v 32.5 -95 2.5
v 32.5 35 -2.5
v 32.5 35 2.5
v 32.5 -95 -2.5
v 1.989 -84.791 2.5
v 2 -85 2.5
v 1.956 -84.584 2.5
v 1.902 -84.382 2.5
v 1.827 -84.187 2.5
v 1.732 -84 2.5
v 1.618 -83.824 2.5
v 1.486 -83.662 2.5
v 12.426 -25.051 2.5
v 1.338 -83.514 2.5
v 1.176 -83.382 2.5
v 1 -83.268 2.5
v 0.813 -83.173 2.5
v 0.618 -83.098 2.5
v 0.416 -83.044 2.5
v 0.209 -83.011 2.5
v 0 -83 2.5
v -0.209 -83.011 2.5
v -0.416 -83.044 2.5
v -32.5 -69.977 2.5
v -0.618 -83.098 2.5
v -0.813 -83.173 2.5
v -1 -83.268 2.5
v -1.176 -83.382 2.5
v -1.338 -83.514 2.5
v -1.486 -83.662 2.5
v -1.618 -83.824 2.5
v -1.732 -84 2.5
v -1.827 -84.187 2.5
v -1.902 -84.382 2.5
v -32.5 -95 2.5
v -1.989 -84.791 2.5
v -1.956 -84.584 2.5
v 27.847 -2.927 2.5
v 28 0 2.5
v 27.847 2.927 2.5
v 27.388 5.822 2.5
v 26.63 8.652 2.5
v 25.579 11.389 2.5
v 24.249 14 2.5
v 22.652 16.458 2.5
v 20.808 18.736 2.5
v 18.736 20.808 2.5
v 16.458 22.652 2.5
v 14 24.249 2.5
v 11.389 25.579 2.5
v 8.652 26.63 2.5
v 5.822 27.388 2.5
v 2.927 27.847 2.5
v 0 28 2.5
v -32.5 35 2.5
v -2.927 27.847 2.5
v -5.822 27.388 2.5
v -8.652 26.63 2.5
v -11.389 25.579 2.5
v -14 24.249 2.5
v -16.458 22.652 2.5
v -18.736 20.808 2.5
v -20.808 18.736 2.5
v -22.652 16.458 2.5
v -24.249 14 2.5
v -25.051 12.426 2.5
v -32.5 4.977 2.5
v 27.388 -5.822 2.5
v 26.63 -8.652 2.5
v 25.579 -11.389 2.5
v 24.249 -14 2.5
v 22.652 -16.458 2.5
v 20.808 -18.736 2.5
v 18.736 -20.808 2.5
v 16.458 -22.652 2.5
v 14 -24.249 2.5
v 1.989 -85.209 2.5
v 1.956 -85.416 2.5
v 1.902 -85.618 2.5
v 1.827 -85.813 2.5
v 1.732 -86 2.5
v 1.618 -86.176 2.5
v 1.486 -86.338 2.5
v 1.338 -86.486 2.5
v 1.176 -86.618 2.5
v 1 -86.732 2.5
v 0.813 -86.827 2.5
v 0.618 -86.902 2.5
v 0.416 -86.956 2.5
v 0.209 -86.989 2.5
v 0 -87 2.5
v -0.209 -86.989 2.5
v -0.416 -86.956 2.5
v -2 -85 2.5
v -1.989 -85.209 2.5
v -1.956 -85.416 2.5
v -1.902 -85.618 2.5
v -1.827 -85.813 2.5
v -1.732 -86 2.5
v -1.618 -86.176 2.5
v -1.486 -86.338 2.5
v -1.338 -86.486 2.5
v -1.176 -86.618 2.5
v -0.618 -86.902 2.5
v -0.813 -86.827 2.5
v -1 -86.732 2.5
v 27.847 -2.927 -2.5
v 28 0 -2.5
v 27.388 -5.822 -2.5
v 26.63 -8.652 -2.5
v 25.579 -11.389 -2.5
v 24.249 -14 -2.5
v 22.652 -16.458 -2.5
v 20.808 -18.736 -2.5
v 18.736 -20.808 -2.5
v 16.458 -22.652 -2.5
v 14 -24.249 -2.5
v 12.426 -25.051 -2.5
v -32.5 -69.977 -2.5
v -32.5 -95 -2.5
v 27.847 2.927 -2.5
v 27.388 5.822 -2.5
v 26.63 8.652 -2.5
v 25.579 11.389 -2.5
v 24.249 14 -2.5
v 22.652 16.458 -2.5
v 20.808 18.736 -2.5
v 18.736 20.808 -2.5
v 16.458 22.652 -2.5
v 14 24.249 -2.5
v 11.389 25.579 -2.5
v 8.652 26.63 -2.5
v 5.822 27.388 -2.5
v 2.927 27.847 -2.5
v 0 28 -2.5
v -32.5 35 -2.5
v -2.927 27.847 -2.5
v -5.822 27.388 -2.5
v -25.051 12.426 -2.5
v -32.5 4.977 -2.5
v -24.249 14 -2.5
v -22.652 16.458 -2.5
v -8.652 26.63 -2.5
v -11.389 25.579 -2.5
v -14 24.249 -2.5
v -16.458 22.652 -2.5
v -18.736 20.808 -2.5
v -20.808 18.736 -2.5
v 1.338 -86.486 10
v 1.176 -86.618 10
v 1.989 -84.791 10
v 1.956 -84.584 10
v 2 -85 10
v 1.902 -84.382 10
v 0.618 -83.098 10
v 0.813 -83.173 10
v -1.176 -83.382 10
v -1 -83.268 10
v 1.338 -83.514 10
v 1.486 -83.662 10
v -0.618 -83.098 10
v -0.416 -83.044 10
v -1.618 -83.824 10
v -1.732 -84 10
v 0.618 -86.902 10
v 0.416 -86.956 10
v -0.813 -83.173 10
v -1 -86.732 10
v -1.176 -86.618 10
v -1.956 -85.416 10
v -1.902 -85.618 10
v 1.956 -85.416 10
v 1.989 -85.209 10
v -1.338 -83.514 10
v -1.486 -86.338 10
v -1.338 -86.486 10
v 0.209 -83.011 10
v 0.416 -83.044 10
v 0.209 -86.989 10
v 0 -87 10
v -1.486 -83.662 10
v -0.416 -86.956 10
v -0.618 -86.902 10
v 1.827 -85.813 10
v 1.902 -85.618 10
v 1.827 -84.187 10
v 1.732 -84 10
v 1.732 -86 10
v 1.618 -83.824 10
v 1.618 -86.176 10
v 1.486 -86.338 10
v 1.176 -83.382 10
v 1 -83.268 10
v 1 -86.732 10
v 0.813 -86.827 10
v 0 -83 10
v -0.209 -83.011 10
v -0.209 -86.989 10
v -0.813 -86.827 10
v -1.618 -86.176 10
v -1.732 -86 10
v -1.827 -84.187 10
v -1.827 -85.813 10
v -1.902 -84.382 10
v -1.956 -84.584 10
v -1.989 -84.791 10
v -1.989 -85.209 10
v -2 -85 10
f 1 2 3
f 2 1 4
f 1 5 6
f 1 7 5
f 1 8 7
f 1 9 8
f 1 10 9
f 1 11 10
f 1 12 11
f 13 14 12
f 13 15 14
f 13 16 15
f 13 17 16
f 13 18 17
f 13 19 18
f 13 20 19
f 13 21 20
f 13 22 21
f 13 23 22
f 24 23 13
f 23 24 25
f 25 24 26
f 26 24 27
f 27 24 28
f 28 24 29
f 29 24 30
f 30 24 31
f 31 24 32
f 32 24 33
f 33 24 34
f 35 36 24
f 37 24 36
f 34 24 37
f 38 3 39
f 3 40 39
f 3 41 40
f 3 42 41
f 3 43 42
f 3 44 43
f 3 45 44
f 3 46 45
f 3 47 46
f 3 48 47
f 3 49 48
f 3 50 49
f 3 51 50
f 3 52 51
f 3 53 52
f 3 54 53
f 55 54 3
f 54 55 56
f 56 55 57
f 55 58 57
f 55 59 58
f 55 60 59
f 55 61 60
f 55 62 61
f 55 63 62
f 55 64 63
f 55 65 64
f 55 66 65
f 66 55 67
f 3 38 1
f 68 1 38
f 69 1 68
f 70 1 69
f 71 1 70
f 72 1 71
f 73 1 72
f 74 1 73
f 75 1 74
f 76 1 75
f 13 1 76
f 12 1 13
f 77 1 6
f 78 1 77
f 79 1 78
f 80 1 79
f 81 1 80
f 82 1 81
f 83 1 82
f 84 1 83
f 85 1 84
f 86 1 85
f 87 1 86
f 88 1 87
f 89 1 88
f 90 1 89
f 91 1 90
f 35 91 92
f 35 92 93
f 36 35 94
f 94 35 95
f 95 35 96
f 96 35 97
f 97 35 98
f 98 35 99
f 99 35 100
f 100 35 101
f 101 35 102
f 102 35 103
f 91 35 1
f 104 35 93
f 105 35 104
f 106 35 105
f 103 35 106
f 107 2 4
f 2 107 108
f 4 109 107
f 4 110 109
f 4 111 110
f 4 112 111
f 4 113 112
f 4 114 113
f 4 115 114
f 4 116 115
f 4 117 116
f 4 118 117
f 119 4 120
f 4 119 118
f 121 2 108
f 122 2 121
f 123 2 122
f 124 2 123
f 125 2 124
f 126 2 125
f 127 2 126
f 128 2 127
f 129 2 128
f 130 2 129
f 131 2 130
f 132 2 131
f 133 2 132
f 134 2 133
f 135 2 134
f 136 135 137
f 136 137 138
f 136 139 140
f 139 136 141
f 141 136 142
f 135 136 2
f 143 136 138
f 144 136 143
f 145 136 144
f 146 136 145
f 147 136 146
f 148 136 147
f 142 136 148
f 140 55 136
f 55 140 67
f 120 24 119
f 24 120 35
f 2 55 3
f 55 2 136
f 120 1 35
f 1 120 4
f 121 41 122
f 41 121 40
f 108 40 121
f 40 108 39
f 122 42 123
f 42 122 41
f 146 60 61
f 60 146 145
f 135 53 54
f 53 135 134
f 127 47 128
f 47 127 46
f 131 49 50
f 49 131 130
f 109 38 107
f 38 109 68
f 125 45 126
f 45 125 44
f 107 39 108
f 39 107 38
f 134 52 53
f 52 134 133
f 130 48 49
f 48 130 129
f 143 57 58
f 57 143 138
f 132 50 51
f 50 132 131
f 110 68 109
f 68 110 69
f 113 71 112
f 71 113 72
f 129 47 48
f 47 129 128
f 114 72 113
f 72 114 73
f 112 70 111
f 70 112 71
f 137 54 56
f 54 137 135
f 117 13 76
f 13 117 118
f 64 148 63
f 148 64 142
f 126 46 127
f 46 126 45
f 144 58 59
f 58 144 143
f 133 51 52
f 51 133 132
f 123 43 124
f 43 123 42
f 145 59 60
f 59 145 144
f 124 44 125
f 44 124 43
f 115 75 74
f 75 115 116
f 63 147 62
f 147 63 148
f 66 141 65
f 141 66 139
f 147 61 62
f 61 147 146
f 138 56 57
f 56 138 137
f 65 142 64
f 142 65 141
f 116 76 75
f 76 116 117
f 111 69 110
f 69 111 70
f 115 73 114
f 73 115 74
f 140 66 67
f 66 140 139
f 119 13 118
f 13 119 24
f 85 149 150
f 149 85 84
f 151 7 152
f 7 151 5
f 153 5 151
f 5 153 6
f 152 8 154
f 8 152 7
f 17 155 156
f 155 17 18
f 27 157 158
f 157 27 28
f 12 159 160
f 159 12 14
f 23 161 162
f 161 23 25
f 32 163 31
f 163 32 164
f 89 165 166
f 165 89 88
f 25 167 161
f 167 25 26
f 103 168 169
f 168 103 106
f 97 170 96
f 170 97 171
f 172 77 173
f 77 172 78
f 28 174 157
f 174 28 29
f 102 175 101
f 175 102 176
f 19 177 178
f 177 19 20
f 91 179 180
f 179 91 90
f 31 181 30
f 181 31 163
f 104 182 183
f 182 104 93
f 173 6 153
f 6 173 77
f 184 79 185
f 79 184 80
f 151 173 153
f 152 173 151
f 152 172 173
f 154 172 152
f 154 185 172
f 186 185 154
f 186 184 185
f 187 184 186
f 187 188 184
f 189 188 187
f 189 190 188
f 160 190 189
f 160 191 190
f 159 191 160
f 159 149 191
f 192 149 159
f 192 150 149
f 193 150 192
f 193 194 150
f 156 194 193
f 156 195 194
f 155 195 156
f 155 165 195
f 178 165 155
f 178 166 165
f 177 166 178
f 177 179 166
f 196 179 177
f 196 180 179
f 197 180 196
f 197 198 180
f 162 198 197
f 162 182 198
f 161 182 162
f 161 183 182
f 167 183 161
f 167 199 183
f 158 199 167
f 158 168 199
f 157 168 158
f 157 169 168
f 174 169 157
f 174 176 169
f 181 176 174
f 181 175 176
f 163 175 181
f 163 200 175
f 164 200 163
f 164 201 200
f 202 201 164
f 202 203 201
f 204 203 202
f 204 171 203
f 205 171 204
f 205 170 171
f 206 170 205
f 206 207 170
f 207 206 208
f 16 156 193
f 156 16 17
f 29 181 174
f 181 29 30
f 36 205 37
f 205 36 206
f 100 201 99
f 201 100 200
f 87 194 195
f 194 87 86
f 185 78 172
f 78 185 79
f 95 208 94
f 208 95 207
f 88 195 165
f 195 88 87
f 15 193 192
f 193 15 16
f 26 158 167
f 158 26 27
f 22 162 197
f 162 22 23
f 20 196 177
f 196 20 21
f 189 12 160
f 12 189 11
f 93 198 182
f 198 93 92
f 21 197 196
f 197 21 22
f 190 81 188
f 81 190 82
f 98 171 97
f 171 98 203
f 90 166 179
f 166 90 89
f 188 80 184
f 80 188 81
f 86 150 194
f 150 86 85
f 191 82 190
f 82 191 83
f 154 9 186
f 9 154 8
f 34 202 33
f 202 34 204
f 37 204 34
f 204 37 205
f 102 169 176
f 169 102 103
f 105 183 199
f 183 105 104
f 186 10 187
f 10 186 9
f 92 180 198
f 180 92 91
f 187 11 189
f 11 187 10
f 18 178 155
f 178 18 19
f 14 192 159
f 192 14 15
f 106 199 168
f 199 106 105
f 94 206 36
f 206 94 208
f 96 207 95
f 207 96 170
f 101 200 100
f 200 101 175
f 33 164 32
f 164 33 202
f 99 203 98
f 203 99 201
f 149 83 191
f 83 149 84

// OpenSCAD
$fn = 60;

difference() {
    difference() {
        translate([0,-30,0])
        cube([65,130,5], true);
        cylinder(8, 28, 28, true) ;
    }
        translate([-20, -20, 0])
    rotate(45)
    translate([-10,0,0])
    cube([80,53,8], true);

}

translate([0,-85,6])
cylinder(8,2,2,true);
